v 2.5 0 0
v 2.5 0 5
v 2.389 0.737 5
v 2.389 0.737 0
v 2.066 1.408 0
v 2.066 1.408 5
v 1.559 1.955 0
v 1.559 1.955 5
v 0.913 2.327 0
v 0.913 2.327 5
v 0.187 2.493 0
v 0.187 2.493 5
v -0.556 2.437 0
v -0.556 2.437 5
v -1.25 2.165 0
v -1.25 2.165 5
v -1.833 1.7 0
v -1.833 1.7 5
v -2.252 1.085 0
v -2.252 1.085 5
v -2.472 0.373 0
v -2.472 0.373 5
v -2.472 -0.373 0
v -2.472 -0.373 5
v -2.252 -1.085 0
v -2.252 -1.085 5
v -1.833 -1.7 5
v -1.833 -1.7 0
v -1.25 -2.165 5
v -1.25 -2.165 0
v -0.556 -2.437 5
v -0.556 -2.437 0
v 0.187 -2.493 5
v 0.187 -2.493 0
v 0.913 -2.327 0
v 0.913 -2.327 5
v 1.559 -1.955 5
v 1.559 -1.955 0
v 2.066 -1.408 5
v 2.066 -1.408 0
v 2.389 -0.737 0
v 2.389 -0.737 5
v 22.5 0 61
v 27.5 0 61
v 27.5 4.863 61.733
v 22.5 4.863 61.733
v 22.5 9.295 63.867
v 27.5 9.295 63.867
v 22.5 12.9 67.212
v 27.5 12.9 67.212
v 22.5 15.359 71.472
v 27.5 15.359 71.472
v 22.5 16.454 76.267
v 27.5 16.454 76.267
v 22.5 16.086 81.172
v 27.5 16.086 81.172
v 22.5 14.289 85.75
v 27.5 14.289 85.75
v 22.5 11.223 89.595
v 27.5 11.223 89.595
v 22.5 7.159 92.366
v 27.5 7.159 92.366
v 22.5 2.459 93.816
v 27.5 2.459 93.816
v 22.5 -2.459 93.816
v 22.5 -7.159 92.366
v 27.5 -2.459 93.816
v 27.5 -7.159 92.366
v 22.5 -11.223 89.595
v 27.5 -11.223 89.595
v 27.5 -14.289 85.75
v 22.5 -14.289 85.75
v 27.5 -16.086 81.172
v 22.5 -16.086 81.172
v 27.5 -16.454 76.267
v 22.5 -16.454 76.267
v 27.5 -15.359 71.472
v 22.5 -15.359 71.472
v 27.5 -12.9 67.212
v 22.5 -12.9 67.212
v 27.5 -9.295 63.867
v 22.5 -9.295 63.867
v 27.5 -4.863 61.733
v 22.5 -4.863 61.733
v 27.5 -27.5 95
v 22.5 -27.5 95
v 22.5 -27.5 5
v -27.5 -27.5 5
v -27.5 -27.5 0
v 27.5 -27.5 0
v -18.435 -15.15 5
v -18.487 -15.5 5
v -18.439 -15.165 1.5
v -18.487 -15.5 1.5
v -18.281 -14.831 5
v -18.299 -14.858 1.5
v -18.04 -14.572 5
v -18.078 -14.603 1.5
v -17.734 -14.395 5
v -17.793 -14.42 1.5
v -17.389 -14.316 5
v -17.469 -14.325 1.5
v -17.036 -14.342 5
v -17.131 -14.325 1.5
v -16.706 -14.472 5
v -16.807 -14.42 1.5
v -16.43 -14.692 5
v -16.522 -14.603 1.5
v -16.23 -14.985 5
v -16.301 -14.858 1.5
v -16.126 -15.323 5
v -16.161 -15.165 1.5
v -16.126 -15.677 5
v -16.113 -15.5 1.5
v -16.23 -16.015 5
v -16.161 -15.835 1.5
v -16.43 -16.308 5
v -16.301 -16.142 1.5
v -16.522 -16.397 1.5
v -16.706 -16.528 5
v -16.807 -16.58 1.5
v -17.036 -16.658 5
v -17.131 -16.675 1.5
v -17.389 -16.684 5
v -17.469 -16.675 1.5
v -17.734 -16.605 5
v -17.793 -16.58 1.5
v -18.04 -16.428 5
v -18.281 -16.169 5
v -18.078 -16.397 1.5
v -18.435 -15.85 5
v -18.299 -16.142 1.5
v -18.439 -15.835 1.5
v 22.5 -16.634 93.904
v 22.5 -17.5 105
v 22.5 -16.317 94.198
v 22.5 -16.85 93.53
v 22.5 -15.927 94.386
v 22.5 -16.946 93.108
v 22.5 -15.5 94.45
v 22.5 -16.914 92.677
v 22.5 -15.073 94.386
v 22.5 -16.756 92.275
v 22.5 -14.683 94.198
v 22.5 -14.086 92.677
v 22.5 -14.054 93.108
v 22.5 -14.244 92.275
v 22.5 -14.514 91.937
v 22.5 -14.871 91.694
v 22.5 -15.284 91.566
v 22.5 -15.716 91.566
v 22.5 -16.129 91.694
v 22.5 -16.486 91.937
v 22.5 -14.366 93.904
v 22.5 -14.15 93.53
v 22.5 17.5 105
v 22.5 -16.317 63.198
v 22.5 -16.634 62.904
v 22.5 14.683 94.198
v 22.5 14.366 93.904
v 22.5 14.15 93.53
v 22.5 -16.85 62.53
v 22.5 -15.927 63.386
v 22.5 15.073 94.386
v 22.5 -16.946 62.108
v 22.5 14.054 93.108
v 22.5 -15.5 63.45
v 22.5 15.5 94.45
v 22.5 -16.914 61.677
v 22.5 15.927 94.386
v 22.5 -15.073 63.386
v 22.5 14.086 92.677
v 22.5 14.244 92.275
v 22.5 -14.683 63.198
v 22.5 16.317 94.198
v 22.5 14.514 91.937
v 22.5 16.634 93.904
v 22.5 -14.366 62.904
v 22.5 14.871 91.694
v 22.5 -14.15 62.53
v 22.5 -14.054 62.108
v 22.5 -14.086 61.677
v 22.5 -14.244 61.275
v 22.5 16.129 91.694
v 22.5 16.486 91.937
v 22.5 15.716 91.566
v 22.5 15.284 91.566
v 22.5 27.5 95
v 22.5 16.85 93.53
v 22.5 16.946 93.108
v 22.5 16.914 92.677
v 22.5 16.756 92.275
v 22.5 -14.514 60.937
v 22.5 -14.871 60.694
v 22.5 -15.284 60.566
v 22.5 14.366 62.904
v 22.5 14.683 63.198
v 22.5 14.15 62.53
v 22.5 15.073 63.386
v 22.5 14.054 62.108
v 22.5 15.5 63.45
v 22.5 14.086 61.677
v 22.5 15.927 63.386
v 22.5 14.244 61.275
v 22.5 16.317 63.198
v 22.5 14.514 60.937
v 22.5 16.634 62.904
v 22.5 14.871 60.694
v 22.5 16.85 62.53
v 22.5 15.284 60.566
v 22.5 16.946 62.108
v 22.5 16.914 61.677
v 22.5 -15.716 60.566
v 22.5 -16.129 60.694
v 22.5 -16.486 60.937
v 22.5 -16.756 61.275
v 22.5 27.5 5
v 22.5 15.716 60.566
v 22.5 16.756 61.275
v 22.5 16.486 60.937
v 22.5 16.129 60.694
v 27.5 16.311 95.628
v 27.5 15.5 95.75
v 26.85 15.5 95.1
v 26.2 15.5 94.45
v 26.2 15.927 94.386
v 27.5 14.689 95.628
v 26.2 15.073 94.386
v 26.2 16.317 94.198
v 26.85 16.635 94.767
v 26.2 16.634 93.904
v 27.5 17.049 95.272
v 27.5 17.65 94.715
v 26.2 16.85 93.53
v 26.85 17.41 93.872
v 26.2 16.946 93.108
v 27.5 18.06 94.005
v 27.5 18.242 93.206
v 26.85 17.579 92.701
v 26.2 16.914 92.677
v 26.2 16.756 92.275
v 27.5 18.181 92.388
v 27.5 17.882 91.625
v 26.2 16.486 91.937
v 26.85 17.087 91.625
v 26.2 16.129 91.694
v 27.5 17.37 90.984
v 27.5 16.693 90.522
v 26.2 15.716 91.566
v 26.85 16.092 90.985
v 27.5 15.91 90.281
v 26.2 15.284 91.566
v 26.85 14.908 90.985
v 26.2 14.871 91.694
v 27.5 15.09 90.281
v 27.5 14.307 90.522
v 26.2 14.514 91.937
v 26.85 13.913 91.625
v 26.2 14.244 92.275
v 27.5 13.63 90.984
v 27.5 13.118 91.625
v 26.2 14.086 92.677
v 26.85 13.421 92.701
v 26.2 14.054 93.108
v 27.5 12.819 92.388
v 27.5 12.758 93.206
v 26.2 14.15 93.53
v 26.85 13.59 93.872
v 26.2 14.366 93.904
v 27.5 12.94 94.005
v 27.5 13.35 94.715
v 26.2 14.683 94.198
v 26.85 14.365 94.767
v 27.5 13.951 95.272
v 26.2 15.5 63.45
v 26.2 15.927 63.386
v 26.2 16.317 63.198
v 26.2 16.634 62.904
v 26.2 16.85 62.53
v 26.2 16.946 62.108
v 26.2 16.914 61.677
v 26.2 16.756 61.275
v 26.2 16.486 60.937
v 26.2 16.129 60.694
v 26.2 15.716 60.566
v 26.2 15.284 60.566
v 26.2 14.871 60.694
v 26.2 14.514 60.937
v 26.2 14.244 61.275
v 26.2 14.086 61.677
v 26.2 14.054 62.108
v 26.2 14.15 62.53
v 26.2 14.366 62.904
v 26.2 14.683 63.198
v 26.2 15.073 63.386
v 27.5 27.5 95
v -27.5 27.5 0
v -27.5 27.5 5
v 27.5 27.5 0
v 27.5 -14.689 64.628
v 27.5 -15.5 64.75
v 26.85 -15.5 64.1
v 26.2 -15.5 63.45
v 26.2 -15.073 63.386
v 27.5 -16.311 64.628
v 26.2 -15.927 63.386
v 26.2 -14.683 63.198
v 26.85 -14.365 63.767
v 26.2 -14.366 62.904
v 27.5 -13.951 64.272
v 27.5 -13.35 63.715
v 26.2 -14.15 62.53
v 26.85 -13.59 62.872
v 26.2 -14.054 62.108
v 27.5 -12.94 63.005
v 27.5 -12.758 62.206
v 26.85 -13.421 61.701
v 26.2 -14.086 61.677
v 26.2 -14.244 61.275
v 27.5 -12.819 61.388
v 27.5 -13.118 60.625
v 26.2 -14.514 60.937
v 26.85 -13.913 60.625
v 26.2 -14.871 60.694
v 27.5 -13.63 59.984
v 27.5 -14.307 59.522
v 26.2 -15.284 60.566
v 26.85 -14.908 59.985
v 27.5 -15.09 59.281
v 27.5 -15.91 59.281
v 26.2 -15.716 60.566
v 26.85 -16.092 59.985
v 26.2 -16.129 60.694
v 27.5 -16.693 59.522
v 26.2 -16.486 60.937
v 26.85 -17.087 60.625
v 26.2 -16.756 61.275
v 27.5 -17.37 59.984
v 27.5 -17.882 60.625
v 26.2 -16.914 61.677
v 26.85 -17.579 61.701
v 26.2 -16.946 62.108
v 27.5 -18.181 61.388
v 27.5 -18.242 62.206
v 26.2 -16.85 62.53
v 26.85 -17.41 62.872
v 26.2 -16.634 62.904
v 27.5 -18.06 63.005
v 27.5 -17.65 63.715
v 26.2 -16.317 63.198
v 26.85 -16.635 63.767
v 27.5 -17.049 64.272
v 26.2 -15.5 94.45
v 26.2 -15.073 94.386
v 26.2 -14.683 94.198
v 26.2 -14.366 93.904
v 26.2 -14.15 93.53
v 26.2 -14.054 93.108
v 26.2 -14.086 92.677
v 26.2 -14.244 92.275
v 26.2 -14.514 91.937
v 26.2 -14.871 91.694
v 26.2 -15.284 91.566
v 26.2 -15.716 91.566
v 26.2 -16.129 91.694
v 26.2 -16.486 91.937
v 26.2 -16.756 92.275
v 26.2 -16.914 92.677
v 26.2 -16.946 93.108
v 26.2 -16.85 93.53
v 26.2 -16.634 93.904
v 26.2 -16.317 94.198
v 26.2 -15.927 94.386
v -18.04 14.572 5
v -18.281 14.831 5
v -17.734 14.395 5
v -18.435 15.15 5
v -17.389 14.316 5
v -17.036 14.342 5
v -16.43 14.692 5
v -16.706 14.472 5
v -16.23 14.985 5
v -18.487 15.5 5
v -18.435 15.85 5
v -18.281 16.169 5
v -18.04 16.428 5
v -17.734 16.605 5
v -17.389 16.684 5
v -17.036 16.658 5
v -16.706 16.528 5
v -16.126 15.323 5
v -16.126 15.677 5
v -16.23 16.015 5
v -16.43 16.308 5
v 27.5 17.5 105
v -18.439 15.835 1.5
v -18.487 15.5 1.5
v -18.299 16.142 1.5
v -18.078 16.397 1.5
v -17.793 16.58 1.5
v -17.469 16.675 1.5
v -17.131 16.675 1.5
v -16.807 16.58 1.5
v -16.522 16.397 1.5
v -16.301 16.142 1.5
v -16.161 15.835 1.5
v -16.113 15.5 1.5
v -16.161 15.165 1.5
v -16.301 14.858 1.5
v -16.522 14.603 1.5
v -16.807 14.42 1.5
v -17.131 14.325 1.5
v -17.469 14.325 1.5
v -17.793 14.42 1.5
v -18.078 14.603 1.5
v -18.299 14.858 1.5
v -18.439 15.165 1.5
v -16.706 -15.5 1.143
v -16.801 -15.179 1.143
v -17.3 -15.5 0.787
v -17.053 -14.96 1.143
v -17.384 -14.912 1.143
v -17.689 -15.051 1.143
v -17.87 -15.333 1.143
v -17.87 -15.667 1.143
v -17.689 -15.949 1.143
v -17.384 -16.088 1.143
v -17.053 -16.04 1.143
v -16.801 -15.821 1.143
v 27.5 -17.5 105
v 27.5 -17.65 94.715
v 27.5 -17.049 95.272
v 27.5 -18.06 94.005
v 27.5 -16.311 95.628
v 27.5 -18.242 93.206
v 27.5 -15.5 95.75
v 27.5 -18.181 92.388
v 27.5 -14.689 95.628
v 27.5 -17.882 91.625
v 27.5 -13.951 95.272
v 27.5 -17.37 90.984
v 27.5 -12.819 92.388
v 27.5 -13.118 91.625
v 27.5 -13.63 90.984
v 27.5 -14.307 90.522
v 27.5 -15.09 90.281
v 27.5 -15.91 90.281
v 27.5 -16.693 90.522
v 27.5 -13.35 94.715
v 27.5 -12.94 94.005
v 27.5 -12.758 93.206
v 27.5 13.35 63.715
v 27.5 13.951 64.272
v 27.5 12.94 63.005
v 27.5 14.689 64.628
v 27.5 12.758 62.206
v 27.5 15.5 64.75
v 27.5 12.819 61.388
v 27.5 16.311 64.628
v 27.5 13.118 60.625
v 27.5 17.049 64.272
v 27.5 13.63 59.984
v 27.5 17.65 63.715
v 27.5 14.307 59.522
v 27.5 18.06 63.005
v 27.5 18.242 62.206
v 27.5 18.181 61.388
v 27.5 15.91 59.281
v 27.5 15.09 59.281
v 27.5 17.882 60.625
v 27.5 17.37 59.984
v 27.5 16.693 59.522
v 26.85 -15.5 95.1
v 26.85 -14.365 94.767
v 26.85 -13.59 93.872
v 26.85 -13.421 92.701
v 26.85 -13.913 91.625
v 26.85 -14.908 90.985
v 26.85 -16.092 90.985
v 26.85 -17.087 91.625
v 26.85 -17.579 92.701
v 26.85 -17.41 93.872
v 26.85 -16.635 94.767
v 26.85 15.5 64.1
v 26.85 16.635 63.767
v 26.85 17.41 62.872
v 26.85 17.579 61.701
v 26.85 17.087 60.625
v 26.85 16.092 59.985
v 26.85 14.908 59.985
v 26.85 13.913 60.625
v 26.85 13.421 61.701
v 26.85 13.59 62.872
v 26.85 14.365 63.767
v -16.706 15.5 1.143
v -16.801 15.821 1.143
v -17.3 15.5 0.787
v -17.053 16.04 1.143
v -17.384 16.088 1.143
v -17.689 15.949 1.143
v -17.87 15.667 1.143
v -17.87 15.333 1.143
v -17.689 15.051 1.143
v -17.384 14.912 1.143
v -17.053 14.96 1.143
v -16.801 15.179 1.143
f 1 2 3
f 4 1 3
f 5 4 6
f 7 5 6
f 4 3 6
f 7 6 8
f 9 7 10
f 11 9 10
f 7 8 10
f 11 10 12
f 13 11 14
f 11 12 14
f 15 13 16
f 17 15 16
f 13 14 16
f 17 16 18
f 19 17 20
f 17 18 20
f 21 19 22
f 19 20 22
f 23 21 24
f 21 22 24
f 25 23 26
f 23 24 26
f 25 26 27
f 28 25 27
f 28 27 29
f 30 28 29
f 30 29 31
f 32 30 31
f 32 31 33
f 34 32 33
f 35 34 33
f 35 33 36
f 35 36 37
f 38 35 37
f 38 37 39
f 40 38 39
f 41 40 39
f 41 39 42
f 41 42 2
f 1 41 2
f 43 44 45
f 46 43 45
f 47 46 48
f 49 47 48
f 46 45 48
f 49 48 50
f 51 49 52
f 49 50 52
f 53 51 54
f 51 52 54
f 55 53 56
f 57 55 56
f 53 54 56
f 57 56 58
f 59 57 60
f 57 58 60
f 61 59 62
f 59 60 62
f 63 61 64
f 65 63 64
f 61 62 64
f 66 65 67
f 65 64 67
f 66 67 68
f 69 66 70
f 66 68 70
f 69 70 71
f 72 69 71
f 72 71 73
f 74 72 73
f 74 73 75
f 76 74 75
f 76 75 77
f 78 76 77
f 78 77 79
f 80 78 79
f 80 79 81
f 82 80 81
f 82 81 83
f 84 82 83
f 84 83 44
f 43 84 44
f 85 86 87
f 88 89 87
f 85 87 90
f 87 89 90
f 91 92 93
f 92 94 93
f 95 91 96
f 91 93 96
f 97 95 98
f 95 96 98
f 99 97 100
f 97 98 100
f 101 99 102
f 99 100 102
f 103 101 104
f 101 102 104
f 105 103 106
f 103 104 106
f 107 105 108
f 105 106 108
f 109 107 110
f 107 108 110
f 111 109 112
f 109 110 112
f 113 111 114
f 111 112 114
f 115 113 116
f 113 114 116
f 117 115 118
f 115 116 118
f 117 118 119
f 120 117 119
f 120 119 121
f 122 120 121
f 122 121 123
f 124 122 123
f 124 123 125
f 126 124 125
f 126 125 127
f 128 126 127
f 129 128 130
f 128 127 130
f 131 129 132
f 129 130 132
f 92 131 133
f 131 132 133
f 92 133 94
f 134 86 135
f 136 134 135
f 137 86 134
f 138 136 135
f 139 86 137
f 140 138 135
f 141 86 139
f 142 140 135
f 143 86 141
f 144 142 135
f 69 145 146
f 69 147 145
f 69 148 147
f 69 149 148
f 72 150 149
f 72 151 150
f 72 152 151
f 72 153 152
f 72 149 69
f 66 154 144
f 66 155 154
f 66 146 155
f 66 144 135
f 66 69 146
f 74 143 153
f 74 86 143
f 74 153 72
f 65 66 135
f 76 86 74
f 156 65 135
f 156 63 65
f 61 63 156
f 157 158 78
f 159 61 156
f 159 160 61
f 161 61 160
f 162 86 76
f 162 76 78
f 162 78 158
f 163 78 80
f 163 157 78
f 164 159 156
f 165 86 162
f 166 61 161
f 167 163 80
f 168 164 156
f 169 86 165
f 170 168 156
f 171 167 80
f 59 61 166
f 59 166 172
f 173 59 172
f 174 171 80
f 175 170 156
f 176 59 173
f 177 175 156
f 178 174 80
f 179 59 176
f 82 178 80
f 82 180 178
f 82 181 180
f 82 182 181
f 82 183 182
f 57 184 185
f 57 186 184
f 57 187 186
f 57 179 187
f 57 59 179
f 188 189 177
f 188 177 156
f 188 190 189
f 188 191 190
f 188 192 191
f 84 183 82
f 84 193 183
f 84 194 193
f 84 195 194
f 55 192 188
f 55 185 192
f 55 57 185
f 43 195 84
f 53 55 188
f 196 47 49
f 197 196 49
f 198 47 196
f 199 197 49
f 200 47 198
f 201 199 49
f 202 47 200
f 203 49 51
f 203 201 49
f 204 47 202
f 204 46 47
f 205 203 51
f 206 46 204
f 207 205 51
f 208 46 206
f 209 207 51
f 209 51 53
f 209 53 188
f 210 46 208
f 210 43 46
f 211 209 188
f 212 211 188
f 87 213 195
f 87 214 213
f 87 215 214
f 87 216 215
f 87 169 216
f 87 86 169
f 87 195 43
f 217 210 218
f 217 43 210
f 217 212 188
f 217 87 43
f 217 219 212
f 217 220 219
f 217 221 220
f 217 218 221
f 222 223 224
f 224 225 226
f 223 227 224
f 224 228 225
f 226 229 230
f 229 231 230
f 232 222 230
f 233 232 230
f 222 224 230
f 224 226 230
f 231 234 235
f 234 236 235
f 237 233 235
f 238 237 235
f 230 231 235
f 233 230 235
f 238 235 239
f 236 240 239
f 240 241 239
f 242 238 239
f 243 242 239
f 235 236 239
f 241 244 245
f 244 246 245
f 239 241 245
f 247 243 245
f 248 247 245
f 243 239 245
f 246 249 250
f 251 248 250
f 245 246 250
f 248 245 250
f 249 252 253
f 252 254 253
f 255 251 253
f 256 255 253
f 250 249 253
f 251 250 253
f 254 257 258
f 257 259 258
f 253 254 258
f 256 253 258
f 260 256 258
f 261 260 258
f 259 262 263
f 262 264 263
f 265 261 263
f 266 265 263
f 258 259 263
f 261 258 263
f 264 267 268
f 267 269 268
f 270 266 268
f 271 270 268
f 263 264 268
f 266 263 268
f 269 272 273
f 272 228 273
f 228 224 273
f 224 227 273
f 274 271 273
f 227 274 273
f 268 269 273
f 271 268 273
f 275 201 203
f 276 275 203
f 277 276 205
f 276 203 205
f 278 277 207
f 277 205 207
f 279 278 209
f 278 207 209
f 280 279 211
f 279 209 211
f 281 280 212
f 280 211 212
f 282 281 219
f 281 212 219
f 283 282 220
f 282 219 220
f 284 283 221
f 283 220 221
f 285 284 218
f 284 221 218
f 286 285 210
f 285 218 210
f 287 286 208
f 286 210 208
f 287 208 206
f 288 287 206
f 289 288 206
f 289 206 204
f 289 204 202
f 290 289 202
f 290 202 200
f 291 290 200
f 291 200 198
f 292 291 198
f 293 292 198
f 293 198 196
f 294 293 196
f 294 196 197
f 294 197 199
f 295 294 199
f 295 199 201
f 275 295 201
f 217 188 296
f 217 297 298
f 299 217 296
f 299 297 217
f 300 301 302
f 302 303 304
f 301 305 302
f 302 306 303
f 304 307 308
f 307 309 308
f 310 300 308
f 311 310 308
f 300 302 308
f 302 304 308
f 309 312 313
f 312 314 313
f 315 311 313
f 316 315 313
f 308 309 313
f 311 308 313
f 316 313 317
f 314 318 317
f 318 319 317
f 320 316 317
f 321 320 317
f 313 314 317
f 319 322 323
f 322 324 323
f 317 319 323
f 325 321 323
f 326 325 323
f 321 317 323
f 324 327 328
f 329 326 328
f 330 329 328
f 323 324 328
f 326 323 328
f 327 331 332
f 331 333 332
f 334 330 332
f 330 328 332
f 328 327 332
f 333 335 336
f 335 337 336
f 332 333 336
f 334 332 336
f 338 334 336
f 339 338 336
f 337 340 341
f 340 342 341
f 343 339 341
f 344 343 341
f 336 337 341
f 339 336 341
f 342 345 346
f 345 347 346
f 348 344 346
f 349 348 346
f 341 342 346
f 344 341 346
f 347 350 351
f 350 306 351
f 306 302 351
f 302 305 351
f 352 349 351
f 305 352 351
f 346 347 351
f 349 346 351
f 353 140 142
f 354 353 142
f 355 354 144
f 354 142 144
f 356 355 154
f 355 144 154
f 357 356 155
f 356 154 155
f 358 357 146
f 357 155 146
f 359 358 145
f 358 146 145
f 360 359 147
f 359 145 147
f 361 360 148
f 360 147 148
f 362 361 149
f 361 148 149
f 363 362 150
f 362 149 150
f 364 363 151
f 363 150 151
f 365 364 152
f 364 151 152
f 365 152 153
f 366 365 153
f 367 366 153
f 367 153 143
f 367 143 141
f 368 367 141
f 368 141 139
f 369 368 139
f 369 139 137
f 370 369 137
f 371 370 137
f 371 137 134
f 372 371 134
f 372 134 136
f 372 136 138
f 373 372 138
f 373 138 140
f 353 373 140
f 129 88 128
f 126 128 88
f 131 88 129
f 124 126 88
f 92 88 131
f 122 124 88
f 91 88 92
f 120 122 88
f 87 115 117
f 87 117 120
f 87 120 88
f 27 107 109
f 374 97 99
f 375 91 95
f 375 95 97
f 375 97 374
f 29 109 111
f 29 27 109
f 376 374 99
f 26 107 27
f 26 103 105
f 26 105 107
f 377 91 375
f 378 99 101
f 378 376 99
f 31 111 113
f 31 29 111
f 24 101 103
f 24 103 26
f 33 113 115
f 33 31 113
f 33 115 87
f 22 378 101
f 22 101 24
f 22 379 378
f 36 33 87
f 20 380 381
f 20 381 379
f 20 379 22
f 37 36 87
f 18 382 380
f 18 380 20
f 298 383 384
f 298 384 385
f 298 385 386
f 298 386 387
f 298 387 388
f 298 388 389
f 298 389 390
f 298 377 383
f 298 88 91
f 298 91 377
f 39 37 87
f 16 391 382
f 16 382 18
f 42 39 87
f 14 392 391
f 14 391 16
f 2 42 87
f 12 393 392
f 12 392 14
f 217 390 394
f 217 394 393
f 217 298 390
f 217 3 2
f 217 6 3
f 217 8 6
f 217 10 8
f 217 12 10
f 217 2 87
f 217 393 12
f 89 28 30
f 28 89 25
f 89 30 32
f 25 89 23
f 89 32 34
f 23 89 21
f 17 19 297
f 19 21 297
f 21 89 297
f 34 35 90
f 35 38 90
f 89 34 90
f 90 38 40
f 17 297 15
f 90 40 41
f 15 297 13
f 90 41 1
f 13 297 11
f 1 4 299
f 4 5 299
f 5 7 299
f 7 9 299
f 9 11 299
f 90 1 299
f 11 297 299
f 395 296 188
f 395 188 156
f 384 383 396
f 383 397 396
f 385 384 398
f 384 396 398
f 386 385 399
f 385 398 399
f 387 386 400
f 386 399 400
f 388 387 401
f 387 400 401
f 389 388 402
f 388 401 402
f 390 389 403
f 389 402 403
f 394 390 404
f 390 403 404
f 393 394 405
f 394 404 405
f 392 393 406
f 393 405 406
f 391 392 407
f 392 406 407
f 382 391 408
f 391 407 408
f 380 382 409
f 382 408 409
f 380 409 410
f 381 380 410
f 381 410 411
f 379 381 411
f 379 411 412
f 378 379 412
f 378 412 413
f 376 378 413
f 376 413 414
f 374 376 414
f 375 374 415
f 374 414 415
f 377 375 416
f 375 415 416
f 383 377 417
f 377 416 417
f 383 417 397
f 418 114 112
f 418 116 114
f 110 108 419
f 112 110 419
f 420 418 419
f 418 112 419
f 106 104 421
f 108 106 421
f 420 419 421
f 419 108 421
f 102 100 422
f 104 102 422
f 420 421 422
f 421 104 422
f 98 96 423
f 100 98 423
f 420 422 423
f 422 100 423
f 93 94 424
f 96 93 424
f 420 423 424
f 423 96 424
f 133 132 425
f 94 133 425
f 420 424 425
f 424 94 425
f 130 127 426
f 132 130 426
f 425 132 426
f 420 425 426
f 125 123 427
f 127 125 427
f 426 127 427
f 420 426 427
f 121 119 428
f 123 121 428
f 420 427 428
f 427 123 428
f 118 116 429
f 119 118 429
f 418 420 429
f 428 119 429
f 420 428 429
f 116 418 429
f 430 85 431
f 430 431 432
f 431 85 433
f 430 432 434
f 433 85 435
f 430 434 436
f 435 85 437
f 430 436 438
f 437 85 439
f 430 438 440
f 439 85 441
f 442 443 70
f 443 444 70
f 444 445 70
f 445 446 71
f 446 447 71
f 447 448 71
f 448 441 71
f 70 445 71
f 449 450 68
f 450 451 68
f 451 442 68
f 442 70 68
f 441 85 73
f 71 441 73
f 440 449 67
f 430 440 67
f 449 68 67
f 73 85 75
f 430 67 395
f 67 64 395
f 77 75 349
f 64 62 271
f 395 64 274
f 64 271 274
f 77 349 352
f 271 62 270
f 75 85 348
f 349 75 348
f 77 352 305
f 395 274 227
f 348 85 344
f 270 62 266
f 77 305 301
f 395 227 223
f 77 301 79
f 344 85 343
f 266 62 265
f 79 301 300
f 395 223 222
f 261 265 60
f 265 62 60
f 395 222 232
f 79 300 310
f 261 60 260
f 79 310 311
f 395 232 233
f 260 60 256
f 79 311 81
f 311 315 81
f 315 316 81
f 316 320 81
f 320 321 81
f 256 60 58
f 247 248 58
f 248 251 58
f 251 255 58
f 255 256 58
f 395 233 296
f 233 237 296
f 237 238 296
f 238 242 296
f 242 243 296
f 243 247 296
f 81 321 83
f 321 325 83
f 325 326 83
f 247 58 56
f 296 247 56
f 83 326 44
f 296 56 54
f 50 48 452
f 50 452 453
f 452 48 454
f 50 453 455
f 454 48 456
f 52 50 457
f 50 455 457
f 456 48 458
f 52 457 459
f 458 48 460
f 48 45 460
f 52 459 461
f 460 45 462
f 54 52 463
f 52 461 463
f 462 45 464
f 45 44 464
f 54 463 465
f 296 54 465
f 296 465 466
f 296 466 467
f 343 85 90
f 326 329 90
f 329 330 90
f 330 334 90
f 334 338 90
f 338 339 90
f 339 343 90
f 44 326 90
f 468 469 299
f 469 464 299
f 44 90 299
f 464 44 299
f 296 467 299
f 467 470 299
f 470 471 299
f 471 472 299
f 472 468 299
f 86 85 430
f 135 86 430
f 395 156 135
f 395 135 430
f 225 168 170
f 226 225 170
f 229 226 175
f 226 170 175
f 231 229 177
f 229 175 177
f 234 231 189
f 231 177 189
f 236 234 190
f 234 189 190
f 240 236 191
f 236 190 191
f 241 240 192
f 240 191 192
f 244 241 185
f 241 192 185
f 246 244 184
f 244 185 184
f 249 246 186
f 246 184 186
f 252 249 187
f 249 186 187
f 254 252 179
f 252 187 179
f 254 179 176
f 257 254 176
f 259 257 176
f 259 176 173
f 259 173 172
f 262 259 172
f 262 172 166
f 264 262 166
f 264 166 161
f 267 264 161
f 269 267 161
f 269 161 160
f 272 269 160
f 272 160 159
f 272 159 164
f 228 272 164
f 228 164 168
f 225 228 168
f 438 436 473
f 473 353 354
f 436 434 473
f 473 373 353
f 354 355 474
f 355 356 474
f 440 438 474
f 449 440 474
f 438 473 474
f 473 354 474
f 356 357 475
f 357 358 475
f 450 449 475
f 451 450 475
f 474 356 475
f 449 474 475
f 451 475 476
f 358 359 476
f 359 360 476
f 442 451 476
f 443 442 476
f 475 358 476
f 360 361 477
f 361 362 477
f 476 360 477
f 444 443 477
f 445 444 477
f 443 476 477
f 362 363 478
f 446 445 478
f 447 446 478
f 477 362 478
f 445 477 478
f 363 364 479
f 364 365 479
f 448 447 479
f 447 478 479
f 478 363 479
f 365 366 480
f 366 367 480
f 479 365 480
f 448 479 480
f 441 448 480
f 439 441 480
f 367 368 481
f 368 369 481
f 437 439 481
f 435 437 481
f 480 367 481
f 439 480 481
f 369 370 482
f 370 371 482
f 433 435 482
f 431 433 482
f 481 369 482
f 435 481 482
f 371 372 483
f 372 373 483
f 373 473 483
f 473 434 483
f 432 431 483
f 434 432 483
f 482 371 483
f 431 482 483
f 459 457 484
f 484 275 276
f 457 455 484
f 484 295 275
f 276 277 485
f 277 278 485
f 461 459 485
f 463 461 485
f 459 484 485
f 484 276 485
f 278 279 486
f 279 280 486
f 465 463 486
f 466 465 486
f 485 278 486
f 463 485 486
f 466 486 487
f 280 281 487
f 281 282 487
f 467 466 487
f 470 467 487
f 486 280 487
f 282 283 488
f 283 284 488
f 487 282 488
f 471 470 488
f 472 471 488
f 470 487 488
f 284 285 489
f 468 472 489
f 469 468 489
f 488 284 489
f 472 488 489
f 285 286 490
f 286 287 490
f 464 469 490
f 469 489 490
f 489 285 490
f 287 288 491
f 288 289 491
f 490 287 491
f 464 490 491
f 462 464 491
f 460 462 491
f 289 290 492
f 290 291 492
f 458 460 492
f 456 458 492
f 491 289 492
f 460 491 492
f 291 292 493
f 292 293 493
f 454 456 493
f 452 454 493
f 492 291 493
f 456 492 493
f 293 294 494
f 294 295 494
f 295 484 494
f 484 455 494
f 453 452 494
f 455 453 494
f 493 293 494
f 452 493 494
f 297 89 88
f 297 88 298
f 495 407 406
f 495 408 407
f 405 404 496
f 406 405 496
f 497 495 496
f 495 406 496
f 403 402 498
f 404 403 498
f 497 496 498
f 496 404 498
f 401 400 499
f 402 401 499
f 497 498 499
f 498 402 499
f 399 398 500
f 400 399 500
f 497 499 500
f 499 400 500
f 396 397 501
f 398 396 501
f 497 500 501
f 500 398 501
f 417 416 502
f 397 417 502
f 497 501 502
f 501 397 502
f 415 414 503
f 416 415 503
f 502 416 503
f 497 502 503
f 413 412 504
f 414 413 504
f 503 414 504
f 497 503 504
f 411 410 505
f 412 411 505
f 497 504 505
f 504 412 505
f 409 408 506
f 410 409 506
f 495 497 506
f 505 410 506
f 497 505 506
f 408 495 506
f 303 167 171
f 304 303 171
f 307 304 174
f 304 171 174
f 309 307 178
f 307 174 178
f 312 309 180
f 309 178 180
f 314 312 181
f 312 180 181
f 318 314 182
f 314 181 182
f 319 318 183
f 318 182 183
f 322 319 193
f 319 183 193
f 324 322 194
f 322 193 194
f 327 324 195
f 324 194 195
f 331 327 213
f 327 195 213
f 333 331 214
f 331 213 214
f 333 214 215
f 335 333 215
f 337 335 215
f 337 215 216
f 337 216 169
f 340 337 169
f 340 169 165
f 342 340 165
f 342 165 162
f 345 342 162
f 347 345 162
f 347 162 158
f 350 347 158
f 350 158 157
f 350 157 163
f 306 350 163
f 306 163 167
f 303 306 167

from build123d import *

# Parameters (mm, degrees)
SKETCH1_W                                         = 55
SKETCH1_H                                         = 55
BOSS_EXTRUDE1_DEPTH                               = 5
SKETCH2_W                                         = 5
SKETCH2_H                                         = 55
BOSS_EXTRUDE2_DEPTH                               = 100
CUT_EXTRUDE1_REACH                                = 57
SKETCH3_R                                         = 16.5
CUT_EXTRUDE2_REACH                                = 7
SKETCH4_R                                         = 2.5
CUT_EXTRUDE3_REACH                                = 57
F_4_48_TAPPED_HOLE1_D                             = 2.3749
F_4_48_TAPPED_HOLE1_DEPTH                         = 3.5
F_4_48_TAPPED_HOLE1_TIP                           = 0.713491942
CSK_FOR_M2_5_FLAT_HEAD_MACHINE_SCREW1_D           = 2.9
CSK_FOR_M2_5_FLAT_HEAD_MACHINE_SCREW1_DEPTH       = 5
CSK_FOR_M2_5_FLAT_HEAD_MACHINE_SCREW1_CSINK_D     = 5.5
CSK_FOR_M2_5_FLAT_HEAD_MACHINE_SCREW1_CSINK_ANGLE = 90


with BuildPart() as part:
    # Sketch1 → Boss-Extrude1 (new body)
    with BuildSketch(Plane.XY):
        Rectangle(SKETCH1_W, SKETCH1_H)
    extrude(amount=BOSS_EXTRUDE1_DEPTH)

    # Sketch2 → Boss-Extrude2 (add)
    with BuildSketch(Plane.XY.offset(5)):
        with Locations((25, 0)):
            Rectangle(SKETCH2_W, SKETCH2_H)
    extrude(amount=BOSS_EXTRUDE2_DEPTH)

    # Sketch3 → Cut-Extrude1 (cut, up to next)
    with BuildSketch(Plane(origin=(27.5, 0, 0), x_dir=(0, 0, -1), z_dir=(1, 0, 0)), mode=Mode.PRIVATE) as cut_extrude1_sk1:
        with Locations((-77.5, 0)):
            Circle(SKETCH3_R)
    cut_extrude1_tool1 = extrude(cut_extrude1_sk1.sketch, amount=-CUT_EXTRUDE1_REACH, mode=Mode.PRIVATE) & part.part
    add(cut_extrude1_tool1.solids().sort_by_distance((27.5, 0, 77.5))[0], mode=Mode.SUBTRACT)

    # Sketch4 → Cut-Extrude2 (cut, up to next)
    with BuildSketch(Plane.XY.offset(5), mode=Mode.PRIVATE) as cut_extrude2_sk1:
        Circle(SKETCH4_R)
    cut_extrude2_tool1 = extrude(cut_extrude2_sk1.sketch, amount=-CUT_EXTRUDE2_REACH, mode=Mode.PRIVATE) & part.part
    add(cut_extrude2_tool1.solids().sort_by_distance((0, 0, 5))[0], mode=Mode.SUBTRACT)

    # Sketch5 → Cut-Extrude3 (cut, up to next)
    with BuildSketch(Plane(origin=(27.5, 0, 0), x_dir=(0, 0, -1), z_dir=(1, 0, 0)), mode=Mode.PRIVATE) as cut_extrude3_sk1:
        Polygon((-105, 27.5), (-95, 27.5), (-105, 17.5), align=None)
    cut_extrude3_tool1 = extrude(cut_extrude3_sk1.sketch, amount=-CUT_EXTRUDE3_REACH, mode=Mode.PRIVATE) & part.part
    add(cut_extrude3_tool1.solids().sort_by_distance((27.5, 24.166667, 101.666667))[0], mode=Mode.SUBTRACT)
    # Sketch5 → Cut-Extrude3 (cut, up to next)
    with BuildSketch(Plane(origin=(27.5, 0, 0), x_dir=(0, 0, -1), z_dir=(1, 0, 0)), mode=Mode.PRIVATE) as cut_extrude3_sk2:
        Polygon((-105, -27.5), (-95, -27.5), (-105, -17.5), align=None)
    cut_extrude3_tool2 = extrude(cut_extrude3_sk2.sketch, amount=-CUT_EXTRUDE3_REACH, mode=Mode.PRIVATE) & part.part
    add(cut_extrude3_tool2.solids().sort_by_distance((27.5, -24.166667, 101.666667))[0], mode=Mode.SUBTRACT)

    # #4-48 Tapped Hole1
    with Locations(Plane.XY.offset(5)):
        with Locations((-17.3, 15.5), (-17.3, -15.5)):
            Hole(F_4_48_TAPPED_HOLE1_D / 2, depth=F_4_48_TAPPED_HOLE1_DEPTH)
            with Locations((0, 0, -(F_4_48_TAPPED_HOLE1_DEPTH + F_4_48_TAPPED_HOLE1_TIP / 2))):  # 118° drill point
                Cone(0, F_4_48_TAPPED_HOLE1_D / 2, F_4_48_TAPPED_HOLE1_TIP, mode=Mode.SUBTRACT)

    # CSK for M2.5 Flat Head Machine Screw1
    with Locations(Plane(origin=(27.5, 0, 0), x_dir=(0, 0, -1), z_dir=(1, 0, 0))):
        with Locations((-93, 15.5), (-62, 15.5), (-62, -15.5), (-93, -15.5)):
            CounterSinkHole(CSK_FOR_M2_5_FLAT_HEAD_MACHINE_SCREW1_D / 2, CSK_FOR_M2_5_FLAT_HEAD_MACHINE_SCREW1_CSINK_D / 2, depth=CSK_FOR_M2_5_FLAT_HEAD_MACHINE_SCREW1_DEPTH, counter_sink_angle=CSK_FOR_M2_5_FLAT_HEAD_MACHINE_SCREW1_CSINK_ANGLE)


solid = part.part
